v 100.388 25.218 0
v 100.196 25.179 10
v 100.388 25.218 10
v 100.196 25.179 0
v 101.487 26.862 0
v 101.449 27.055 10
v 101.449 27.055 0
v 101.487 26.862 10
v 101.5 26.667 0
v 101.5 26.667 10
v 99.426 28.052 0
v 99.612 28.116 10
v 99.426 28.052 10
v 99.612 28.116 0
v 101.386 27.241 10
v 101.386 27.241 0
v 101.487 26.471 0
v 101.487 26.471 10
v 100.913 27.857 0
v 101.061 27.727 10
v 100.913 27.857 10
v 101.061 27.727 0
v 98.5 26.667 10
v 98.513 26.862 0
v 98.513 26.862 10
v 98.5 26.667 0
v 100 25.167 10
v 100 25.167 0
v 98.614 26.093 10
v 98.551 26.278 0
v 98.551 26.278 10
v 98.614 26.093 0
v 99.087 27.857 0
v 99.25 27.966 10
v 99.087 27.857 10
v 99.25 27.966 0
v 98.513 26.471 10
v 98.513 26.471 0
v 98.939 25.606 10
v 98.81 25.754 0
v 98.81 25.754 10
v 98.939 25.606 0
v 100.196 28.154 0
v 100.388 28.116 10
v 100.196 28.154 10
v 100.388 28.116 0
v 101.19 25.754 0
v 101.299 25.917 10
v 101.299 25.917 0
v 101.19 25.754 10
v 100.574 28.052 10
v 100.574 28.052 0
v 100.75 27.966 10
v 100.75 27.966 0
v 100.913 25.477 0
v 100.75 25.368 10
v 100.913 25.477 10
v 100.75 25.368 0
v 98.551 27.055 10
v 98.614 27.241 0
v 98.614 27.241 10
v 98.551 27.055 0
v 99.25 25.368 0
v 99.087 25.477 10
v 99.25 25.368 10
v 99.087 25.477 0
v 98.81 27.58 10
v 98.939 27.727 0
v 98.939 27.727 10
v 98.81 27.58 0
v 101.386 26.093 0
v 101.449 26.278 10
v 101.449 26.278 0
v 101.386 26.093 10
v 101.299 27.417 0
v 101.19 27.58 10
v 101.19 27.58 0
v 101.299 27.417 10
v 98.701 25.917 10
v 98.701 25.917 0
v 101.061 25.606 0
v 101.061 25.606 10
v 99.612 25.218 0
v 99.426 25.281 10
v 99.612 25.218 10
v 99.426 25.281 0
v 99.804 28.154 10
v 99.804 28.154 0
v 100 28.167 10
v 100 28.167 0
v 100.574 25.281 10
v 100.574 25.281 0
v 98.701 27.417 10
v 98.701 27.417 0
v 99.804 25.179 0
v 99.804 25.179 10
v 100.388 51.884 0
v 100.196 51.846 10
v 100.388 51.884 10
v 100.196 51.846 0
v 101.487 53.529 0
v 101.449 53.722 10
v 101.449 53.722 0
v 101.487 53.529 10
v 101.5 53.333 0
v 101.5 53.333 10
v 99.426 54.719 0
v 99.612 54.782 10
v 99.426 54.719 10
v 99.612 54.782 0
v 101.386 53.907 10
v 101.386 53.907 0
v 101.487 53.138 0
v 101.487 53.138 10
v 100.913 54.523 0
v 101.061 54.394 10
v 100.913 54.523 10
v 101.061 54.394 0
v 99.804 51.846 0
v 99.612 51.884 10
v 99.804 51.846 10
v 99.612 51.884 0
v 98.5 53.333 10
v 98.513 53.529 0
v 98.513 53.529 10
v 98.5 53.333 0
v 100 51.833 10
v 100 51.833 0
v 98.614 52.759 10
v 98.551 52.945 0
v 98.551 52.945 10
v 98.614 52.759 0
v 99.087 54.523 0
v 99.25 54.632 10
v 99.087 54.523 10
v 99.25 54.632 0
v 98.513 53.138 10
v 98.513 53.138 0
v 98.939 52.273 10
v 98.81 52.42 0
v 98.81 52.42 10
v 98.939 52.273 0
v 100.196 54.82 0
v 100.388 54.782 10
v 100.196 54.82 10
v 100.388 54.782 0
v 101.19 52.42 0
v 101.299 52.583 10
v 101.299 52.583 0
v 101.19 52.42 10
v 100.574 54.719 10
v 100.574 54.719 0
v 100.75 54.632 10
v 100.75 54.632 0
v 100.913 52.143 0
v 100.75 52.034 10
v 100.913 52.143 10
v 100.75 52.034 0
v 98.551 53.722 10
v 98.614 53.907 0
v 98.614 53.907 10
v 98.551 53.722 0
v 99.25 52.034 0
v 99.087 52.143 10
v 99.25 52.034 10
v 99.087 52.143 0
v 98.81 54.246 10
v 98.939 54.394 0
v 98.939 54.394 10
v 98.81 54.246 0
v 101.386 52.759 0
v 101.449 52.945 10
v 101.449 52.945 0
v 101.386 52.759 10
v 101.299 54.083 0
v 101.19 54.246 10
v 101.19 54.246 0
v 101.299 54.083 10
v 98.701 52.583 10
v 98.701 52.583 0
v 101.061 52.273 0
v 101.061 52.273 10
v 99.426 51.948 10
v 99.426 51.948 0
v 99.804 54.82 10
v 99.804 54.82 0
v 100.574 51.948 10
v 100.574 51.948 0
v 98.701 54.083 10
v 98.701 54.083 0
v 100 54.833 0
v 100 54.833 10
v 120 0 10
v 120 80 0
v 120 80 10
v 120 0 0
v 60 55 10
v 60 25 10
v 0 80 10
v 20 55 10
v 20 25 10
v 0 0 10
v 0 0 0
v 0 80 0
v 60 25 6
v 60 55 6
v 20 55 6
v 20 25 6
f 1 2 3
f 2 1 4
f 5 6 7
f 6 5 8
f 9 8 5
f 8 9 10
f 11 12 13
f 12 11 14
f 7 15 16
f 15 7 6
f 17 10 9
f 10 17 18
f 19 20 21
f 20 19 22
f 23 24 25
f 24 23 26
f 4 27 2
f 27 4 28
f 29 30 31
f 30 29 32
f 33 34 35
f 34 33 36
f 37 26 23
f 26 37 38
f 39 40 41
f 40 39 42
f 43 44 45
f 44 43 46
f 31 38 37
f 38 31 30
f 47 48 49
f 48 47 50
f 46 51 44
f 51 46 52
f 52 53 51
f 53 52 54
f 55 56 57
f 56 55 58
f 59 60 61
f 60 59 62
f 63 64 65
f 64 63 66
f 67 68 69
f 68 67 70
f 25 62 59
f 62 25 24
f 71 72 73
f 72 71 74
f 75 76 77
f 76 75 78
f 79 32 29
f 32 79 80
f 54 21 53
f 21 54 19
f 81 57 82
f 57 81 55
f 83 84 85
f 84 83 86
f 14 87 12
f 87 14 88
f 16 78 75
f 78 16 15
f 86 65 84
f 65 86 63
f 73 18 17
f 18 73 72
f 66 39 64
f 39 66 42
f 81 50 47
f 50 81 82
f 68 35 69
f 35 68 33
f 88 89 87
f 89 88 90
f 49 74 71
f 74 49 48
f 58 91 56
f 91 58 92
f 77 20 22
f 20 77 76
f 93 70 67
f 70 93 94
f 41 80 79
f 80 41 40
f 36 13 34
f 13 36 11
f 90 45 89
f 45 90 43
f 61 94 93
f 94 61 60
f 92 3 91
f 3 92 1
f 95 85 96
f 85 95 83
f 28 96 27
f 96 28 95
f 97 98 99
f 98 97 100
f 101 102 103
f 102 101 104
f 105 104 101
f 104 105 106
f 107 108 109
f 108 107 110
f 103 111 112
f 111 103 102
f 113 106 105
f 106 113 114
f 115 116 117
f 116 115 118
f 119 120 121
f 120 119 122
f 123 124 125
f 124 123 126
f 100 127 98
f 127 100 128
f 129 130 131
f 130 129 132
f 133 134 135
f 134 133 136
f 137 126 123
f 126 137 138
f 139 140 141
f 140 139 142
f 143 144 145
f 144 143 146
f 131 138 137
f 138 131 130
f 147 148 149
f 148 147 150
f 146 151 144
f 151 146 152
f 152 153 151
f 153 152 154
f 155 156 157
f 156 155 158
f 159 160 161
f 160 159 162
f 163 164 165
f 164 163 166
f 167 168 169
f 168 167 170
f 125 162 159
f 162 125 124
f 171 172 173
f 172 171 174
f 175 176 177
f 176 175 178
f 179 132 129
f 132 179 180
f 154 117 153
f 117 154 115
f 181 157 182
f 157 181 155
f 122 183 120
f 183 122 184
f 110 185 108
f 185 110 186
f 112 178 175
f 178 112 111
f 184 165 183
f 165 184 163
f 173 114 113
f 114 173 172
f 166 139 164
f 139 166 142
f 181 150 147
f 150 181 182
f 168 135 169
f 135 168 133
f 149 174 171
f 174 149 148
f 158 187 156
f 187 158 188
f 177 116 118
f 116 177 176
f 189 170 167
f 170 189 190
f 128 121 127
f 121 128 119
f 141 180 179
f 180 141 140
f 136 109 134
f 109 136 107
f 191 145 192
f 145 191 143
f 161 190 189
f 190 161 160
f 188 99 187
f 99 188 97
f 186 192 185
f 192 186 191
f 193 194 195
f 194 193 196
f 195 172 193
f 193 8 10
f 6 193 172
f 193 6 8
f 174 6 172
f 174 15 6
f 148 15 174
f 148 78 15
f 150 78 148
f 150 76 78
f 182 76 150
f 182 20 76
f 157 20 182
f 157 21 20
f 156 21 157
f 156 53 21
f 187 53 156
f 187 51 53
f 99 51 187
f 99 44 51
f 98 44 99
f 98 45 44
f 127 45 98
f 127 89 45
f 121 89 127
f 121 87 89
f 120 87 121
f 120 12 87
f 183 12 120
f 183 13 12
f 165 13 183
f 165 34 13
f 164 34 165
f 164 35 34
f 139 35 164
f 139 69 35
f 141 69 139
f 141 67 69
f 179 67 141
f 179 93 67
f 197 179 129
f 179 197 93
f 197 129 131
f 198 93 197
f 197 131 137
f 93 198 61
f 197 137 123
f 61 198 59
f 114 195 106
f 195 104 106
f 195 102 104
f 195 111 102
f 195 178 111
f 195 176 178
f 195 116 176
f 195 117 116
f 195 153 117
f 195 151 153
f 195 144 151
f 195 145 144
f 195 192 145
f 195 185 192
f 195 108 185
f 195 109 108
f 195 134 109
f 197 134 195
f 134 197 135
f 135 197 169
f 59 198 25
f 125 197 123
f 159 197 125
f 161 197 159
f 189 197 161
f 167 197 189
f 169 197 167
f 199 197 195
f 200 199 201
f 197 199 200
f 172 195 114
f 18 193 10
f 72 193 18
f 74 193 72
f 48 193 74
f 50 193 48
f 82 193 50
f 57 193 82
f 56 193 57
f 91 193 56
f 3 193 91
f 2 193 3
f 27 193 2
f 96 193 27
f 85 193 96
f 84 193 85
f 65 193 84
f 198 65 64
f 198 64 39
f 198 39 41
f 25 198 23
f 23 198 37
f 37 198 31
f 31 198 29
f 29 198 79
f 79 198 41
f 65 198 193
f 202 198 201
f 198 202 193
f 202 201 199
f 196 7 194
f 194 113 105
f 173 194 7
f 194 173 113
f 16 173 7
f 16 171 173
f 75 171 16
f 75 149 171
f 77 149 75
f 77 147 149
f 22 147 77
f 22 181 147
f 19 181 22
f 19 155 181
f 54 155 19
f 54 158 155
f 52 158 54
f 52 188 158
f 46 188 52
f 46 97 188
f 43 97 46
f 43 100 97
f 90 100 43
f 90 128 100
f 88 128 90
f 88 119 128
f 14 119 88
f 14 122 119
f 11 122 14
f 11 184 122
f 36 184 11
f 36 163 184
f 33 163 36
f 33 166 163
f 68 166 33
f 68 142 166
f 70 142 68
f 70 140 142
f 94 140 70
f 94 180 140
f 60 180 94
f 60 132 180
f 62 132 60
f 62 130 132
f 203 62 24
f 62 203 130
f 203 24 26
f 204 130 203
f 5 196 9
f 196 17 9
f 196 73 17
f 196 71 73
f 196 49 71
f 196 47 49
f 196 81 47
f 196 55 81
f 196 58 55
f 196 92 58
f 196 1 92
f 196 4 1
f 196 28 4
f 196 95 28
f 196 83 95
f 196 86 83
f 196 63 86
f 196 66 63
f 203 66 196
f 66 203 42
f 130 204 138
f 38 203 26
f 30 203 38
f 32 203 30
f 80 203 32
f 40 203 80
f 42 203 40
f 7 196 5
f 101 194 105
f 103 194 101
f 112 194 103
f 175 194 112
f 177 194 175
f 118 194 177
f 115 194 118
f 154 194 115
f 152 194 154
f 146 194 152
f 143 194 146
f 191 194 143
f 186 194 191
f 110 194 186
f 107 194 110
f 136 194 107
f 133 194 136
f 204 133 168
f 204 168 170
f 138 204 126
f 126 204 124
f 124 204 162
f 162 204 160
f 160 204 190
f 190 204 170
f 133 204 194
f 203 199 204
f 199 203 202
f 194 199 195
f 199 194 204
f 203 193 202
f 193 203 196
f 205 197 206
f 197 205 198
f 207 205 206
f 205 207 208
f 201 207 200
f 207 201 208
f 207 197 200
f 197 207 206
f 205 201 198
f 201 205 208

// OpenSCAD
// Router coupon: a plate with a pocket and a column of holes, the first part cut
// on the garage's router. Its wrapper (apothecary/projects/parts/router_coupon.py)
// says the cuts that make it from its stock: the pocket, the holes, the outline,
// in that order; this file draws the plate those cuts leave.
//
// The plate stands at the origin, its top at z = thickness. The toolpath's zero is
// the stock's front-left top corner: the stock is the plate plus stock_margin on
// every side, so the plate's corner is at (stock_margin, stock_margin) and its top
// is the toolpath's z = 0.
//
// Parameters:
//   plate_x, plate_y  the plate, X and Y (mm)
//   thickness         the stock's, and the plate's
//   pocket_w, pocket_h, pocket_depth  the pocket, 20 mm in from the left, centred in Y
//   hole_diameter, holes              a column of holes 20 mm in from the right, evenly along Y
//   stock_margin      stock beyond the plate on each side: the toolpath's, not drawn

plate_x = 120;       // [40:5:400] the plate's width
plate_y = 80;        // [40:5:600] the plate's depth
thickness = 10;      // [3:1:40] the stock's thickness
pocket_w = 40;       // [6:1:200] the pocket's width
pocket_h = 30;       // [6:1:200] the pocket's depth, in Y
pocket_depth = 4;    // [1:0.5:20] how deep the pocket goes
hole_diameter = 3;   // [1:0.5:30] each hole's diameter
holes = 2;           // [0:1:6] holes in the column
stock_margin = 10;   // [0:1:50] stock beyond the plate on every side (the toolpath's)

/* [Hidden] */
$fn = 48;

module coupon() {
    difference() {
        cube([plate_x, plate_y, thickness]);
        // The pocket, open at the top.
        translate([20, (plate_y - pocket_h) / 2, thickness - pocket_depth])
            cube([pocket_w, pocket_h, pocket_depth + 1]);
        // The holes, through.
        for (i = [0 : holes - 1])
            translate([plate_x - 20, plate_y * (i + 1) / (holes + 1), -1])
                cylinder(d = hole_diameter, h = thickness + 2);
    }
}

coupon();
